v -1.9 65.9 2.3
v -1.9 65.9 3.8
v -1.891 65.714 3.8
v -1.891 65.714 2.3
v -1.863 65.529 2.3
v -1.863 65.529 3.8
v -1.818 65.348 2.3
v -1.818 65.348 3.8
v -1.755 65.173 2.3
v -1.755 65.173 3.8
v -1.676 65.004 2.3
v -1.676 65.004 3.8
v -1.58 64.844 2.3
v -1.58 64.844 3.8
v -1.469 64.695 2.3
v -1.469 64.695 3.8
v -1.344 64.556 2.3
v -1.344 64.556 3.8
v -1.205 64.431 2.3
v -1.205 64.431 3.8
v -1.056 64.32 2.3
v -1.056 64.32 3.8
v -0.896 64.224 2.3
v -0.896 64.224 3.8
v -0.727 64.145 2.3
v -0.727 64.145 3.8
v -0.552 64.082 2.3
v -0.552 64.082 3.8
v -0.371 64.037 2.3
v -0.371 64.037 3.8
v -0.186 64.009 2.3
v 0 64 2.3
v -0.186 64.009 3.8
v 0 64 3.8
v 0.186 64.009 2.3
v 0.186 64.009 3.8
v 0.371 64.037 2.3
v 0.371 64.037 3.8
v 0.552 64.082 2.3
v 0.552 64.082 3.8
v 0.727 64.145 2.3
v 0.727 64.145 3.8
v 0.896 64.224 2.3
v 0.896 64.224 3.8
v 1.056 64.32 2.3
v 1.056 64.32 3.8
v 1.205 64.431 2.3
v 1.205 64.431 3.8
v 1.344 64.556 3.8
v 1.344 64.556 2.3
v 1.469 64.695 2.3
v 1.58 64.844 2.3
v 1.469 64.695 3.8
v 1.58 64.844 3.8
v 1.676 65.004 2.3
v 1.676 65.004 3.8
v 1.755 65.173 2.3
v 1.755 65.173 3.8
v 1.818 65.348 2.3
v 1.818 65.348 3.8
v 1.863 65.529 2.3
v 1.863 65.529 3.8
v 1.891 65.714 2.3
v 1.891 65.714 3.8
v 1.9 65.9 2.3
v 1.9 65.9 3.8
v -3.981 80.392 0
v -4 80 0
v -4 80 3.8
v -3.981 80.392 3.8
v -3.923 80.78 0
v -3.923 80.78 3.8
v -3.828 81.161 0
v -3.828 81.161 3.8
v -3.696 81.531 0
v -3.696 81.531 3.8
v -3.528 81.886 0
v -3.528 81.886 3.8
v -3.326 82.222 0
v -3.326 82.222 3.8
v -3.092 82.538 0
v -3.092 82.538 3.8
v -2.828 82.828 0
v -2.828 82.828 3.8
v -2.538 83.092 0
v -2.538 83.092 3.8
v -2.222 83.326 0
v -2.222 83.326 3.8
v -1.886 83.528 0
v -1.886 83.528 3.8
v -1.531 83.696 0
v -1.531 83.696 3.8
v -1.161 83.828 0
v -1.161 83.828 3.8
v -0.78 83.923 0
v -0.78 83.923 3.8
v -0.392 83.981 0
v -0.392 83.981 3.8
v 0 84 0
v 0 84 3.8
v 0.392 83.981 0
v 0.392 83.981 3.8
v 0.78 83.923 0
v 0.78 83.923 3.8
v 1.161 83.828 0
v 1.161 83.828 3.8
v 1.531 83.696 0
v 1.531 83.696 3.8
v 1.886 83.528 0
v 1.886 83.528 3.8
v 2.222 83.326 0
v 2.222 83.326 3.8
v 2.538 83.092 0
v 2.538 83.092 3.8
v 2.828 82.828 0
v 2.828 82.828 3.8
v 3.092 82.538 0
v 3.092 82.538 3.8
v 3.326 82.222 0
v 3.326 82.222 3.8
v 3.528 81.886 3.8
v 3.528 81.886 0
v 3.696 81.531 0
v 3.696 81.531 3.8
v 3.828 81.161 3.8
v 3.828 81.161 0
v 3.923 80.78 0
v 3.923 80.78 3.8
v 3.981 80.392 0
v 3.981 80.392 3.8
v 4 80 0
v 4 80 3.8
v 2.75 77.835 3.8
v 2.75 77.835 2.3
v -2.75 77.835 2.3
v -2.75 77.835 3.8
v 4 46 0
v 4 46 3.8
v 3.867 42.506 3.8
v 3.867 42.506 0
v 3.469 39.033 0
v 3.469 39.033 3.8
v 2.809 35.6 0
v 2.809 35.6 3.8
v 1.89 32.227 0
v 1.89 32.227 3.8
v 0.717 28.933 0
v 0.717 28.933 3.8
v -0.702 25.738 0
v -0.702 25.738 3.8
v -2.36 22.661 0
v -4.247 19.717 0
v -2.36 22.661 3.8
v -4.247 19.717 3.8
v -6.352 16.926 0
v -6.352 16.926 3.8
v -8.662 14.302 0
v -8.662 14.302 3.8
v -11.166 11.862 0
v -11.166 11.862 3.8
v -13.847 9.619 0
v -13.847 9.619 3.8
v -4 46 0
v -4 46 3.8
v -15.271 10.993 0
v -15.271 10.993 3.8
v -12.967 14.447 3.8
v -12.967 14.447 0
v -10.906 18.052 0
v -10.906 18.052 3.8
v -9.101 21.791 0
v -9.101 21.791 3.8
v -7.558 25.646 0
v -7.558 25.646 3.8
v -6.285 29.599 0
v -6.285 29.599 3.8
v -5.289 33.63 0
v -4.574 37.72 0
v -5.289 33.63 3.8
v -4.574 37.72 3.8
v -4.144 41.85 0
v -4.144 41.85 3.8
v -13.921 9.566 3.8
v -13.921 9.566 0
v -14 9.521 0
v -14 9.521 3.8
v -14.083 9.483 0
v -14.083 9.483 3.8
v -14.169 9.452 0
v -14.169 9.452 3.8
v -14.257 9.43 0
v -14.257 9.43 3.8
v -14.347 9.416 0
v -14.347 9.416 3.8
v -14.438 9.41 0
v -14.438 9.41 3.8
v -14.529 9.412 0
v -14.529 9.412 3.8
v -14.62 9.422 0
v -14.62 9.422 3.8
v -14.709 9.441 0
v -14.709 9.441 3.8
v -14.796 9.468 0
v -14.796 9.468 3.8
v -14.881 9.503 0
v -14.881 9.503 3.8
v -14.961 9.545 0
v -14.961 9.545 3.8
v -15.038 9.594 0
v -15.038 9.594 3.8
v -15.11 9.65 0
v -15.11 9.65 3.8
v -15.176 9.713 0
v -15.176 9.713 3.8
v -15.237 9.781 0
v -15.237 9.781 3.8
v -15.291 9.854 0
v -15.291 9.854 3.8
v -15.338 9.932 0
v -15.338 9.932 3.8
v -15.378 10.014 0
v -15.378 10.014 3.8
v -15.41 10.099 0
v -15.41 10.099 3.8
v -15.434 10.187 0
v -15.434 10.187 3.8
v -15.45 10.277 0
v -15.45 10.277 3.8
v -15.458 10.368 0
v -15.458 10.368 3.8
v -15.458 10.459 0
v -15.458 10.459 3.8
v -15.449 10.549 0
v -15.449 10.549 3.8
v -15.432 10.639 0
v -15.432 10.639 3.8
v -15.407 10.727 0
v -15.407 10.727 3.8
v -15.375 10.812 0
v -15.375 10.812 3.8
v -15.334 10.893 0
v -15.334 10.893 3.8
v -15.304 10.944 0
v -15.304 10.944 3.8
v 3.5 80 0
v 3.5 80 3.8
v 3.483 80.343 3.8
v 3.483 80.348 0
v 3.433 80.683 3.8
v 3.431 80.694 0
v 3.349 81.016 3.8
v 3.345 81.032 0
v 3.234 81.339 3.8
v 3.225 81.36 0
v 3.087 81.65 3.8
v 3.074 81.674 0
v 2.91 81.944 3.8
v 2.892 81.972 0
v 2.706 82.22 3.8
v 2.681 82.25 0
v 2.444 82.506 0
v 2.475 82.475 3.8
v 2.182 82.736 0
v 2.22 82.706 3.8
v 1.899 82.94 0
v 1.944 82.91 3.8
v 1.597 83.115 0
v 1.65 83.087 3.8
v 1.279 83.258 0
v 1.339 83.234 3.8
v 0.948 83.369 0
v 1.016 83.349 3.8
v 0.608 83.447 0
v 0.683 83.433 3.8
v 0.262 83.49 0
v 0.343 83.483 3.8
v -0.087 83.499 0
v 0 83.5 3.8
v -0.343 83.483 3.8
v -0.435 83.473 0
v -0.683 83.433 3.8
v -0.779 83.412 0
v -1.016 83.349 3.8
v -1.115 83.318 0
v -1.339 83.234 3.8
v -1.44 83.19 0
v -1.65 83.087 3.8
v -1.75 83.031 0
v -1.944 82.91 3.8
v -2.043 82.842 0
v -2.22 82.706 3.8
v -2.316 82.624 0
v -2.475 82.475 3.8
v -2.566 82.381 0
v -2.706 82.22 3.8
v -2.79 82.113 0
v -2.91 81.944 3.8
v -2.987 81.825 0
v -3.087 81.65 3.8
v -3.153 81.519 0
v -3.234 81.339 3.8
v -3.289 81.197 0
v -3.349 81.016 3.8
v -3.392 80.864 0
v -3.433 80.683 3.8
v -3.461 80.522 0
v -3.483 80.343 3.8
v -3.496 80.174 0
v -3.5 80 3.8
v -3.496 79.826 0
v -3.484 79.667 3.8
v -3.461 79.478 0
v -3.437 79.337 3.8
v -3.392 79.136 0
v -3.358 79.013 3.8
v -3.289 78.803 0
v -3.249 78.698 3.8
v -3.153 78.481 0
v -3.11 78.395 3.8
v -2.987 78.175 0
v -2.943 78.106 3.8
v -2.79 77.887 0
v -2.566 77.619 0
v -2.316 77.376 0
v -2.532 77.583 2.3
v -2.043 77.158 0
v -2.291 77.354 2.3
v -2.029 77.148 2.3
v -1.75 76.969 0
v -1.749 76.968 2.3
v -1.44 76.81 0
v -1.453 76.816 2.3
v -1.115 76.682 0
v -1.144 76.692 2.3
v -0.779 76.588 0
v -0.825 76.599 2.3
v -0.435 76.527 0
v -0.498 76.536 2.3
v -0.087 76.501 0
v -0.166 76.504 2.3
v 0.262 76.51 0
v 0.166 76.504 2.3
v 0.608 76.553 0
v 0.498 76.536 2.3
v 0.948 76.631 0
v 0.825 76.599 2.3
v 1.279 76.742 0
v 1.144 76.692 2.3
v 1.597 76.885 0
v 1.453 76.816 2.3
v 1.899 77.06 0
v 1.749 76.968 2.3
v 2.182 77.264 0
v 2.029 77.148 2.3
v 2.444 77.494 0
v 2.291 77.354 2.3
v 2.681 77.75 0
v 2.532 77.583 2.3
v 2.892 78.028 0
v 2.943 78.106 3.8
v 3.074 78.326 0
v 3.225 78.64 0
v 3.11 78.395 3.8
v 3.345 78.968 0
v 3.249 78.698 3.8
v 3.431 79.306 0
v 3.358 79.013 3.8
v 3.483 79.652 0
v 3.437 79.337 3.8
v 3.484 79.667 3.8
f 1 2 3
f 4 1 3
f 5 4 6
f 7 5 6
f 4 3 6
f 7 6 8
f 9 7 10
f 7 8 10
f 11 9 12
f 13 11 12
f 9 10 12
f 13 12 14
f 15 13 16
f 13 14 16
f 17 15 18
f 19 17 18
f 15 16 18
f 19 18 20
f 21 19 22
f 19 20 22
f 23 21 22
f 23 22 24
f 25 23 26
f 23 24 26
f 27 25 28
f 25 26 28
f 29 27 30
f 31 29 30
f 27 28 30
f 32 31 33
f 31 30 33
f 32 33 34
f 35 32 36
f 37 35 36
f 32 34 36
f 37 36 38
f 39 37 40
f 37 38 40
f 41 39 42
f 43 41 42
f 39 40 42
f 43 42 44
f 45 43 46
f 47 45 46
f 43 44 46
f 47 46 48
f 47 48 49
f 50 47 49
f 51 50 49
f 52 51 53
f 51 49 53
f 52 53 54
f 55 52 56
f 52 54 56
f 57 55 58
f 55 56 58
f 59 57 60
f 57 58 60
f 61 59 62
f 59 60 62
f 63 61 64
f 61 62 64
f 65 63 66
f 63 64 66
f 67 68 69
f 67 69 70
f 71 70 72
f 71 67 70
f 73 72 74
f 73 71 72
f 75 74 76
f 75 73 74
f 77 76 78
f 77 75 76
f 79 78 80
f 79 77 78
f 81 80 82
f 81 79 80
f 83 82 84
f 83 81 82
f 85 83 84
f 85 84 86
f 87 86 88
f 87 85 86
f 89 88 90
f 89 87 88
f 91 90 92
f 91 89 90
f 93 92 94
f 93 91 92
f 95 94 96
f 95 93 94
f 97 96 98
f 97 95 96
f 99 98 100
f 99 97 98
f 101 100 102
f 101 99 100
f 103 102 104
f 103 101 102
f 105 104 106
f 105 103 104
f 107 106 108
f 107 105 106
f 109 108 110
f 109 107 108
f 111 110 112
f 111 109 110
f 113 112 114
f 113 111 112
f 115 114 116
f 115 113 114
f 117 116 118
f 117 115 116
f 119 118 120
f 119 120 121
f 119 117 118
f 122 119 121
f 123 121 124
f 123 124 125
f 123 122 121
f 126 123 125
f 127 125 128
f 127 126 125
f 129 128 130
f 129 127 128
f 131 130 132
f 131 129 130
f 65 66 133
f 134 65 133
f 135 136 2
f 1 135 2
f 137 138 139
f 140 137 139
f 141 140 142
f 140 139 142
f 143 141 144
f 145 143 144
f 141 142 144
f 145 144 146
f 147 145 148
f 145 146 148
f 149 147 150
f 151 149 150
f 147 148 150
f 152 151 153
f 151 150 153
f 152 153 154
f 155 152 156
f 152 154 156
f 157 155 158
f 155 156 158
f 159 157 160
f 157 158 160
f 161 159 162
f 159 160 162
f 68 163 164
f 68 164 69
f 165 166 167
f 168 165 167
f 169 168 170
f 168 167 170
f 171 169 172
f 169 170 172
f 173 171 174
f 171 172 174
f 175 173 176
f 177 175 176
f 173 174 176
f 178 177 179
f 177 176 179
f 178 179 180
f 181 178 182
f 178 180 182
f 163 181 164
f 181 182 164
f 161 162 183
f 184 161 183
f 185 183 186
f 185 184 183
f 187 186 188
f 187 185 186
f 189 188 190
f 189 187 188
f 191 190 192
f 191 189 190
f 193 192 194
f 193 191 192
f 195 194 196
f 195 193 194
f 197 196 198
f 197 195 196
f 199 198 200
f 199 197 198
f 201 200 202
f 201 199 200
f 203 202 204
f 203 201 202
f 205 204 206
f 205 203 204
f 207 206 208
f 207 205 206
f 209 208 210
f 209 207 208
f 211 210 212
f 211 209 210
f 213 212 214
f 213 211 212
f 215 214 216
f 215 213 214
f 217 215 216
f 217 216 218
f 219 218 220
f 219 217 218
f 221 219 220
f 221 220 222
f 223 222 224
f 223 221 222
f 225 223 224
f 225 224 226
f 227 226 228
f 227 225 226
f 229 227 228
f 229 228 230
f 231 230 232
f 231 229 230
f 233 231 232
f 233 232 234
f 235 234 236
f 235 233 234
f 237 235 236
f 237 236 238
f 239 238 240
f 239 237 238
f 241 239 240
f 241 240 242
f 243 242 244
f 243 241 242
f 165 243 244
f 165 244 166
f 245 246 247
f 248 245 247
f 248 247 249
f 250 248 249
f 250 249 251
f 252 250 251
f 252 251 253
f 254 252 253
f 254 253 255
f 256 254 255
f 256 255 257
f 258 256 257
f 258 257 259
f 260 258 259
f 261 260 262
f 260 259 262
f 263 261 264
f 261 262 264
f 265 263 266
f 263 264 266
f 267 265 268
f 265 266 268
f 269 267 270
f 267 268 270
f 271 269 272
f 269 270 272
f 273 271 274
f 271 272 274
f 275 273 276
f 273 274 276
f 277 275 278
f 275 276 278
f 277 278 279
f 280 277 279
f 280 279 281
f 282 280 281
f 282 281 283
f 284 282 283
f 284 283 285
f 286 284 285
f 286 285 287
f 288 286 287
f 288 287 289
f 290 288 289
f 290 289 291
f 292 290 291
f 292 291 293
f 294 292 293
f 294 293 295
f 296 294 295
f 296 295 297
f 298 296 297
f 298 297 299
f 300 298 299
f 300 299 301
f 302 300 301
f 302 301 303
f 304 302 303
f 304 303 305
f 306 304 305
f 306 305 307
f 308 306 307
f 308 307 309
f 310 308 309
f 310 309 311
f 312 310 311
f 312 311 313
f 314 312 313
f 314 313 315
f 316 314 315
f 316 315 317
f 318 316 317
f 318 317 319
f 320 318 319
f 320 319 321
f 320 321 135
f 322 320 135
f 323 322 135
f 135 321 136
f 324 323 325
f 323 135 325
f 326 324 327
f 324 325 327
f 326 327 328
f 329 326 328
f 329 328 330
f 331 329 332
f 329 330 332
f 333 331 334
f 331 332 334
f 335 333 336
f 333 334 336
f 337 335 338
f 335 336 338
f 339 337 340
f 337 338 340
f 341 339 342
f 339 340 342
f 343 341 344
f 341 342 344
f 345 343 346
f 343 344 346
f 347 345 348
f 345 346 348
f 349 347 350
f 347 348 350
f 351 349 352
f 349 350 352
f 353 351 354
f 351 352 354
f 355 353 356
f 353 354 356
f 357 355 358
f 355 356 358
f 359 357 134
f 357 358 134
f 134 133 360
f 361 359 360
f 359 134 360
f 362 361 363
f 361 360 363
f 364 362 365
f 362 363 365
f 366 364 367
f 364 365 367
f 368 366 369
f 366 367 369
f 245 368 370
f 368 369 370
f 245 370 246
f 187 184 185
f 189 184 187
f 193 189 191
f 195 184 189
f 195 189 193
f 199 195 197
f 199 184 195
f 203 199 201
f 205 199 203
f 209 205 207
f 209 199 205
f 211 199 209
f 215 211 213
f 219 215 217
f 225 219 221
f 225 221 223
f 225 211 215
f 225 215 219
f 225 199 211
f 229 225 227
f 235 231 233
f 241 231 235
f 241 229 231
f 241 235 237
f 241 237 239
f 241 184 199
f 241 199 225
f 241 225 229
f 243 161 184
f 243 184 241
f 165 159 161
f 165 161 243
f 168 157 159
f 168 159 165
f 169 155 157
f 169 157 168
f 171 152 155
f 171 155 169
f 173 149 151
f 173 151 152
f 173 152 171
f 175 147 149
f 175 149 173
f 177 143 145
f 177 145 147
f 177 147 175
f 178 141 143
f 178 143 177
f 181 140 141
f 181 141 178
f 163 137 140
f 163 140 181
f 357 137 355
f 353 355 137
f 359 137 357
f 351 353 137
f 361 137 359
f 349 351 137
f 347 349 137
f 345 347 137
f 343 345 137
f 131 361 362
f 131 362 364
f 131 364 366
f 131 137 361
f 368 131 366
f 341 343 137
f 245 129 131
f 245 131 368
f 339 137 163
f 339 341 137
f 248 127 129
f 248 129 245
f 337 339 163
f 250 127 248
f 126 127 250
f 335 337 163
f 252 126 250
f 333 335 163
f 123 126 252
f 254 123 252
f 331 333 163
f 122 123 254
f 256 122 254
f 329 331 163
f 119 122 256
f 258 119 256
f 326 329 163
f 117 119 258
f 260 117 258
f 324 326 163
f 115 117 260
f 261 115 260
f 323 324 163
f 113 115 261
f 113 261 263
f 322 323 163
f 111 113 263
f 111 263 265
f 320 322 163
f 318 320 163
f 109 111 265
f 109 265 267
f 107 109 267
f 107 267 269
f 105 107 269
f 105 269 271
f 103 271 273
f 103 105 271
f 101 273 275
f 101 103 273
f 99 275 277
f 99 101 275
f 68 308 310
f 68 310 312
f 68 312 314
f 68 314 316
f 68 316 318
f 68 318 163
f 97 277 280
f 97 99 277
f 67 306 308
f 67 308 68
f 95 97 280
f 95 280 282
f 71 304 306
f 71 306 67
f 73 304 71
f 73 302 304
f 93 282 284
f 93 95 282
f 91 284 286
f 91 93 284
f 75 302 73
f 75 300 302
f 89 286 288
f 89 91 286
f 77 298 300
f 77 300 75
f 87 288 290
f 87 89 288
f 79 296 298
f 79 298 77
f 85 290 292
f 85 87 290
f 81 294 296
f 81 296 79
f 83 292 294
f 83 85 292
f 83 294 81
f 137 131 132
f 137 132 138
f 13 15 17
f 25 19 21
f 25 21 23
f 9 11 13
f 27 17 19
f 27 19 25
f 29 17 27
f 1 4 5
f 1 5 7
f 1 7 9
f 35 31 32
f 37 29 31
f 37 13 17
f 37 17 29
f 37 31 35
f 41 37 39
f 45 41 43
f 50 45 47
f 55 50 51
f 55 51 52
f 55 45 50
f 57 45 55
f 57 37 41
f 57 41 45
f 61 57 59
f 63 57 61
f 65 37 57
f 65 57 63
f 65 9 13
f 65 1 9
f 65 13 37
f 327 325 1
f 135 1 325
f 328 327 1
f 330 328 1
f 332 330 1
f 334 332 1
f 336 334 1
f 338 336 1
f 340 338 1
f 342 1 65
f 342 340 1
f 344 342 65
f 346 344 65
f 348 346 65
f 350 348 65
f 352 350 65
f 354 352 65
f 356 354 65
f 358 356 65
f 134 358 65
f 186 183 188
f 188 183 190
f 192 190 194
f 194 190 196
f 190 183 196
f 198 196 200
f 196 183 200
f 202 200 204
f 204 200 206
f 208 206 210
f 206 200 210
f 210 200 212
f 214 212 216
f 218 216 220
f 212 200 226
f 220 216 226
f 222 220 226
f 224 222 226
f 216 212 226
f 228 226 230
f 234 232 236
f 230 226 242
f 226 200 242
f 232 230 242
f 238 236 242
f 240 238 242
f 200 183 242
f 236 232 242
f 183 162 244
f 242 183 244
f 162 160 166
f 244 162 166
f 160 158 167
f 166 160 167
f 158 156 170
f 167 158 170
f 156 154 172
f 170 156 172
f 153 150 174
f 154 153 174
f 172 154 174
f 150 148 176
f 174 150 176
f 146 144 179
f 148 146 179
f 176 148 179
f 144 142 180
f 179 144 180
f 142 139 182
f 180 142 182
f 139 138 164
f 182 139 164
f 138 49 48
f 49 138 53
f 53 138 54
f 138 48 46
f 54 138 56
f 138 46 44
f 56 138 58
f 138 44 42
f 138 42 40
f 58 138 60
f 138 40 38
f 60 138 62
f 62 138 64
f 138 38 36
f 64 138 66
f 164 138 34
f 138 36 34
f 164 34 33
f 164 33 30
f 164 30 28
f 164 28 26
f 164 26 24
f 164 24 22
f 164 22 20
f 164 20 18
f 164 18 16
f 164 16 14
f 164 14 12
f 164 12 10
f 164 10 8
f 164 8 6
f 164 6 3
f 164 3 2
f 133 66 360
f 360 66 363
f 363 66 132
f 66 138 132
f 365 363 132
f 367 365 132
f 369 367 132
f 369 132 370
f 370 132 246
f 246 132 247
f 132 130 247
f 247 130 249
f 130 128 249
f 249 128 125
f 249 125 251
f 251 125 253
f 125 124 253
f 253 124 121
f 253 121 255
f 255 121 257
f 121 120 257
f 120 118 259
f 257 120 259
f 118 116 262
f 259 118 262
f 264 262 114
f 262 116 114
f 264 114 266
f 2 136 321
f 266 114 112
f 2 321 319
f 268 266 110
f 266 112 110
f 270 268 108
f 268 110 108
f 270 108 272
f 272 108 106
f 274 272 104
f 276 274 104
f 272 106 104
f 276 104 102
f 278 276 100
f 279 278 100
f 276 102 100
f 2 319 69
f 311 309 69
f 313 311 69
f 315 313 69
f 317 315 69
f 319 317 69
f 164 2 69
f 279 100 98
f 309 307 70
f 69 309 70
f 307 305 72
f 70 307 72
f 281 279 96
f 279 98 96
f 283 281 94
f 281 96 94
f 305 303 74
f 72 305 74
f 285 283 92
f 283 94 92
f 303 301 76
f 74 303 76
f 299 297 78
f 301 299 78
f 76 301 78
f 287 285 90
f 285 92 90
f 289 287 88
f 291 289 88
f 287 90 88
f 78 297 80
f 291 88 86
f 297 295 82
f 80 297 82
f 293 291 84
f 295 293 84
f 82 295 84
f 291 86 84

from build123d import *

# Parameters (mm, degrees)
SCHIZZO1_R                   = 1.897864919
ESTRUSIONE_ESTRUSIONE1_DEPTH = 3.8
SCHIZZO7_W                   = 8
SCHIZZO7_H                   = 50
TAGLIO_ESTRUSIONE4_DEPTH     = 3.8
ESTRUSIONE_ESTRUSIONE4_DEPTH = 3.8
RACCORDO2_R                  = 1
SCHIZZO10_R                  = 3.5
TAGLIO_ESTRUSIONE5_DEPTH     = 10
TAGLIO_ESTRUSIONE6_DEPTH     = 1.5


with BuildPart() as part:
    # Schizzo1 → Estrusione-Estrusione1 (new body)
    with BuildSketch(Plane.XY):
        with BuildLine():
            Line((-4, 0), (-4, 80))
            ThreePointArc((-4, 80), (0, 84), (4, 80))
            Line((4, 80), (4, 0))
            ThreePointArc((4, 0), (0, -4), (-4, 0))
        make_face()
        with Locations(Location((0, 80, 0), (0, 0, 180))):
            Circle(SCHIZZO1_R, mode=Mode.SUBTRACT)
    extrude(amount=ESTRUSIONE_ESTRUSIONE1_DEPTH)

    # Schizzo7 → Taglio-Estrusione4 (cut)
    with BuildSketch(Plane.XY.offset(3.8)):
        with Locations((0, 21)):
            Rectangle(SCHIZZO7_W, SCHIZZO7_H)
    extrude(amount=-TAGLIO_ESTRUSIONE4_DEPTH, mode=Mode.SUBTRACT)

    # Schizzo9 → Estrusione-Estrusione4 (add)
    with BuildSketch(Plane.XY.offset(3.8)):
        with BuildLine():
            Line((-4, 46), (4, 46))
            ThreePointArc((4, 46), (-2.243289818, 22.859693708), (-19.27864045, 6))
            ThreePointArc((-19.27864045, 6), (-7.949658462, 24.590674614), (-4, 46))
        make_face()
    extrude(amount=-ESTRUSIONE_ESTRUSIONE4_DEPTH)

    # Raccordo2
    raccordo2_edges = [part.edges().sort_by_distance(p)[0] for p in [
        (-19.27864045, 6, 1.9),
    ]]
    fillet(raccordo2_edges, radius=RACCORDO2_R)

    # Schizzo10 → Taglio-Estrusione5 (cut)
    with BuildSketch(Plane.XY.offset(3.8)):
        with Locations((0, 80)):
            Circle(SCHIZZO10_R)
    extrude(amount=-TAGLIO_ESTRUSIONE5_DEPTH, mode=Mode.SUBTRACT)

    # Schizzo13 → Taglio-Estrusione6 (cut)
    with BuildSketch(Plane.XY.offset(3.8)):
        with BuildLine():
            Line((-2.75, 77.834936491), (-1.9, 65.9))
            ThreePointArc((-1.9, 65.9), (0, 64), (1.9, 65.9))
            Line((1.9, 65.9), (2.75, 77.834936491))
            ThreePointArc((2.75, 77.834936491), (1.145643924, 83.307189139), (-3.5, 80))
            ThreePointArc((-3.5, 80), (-3.307189139, 78.854356076), (-2.75, 77.834936491))
        make_face()
    extrude(amount=-TAGLIO_ESTRUSIONE6_DEPTH, mode=Mode.SUBTRACT)


solid = part.part
